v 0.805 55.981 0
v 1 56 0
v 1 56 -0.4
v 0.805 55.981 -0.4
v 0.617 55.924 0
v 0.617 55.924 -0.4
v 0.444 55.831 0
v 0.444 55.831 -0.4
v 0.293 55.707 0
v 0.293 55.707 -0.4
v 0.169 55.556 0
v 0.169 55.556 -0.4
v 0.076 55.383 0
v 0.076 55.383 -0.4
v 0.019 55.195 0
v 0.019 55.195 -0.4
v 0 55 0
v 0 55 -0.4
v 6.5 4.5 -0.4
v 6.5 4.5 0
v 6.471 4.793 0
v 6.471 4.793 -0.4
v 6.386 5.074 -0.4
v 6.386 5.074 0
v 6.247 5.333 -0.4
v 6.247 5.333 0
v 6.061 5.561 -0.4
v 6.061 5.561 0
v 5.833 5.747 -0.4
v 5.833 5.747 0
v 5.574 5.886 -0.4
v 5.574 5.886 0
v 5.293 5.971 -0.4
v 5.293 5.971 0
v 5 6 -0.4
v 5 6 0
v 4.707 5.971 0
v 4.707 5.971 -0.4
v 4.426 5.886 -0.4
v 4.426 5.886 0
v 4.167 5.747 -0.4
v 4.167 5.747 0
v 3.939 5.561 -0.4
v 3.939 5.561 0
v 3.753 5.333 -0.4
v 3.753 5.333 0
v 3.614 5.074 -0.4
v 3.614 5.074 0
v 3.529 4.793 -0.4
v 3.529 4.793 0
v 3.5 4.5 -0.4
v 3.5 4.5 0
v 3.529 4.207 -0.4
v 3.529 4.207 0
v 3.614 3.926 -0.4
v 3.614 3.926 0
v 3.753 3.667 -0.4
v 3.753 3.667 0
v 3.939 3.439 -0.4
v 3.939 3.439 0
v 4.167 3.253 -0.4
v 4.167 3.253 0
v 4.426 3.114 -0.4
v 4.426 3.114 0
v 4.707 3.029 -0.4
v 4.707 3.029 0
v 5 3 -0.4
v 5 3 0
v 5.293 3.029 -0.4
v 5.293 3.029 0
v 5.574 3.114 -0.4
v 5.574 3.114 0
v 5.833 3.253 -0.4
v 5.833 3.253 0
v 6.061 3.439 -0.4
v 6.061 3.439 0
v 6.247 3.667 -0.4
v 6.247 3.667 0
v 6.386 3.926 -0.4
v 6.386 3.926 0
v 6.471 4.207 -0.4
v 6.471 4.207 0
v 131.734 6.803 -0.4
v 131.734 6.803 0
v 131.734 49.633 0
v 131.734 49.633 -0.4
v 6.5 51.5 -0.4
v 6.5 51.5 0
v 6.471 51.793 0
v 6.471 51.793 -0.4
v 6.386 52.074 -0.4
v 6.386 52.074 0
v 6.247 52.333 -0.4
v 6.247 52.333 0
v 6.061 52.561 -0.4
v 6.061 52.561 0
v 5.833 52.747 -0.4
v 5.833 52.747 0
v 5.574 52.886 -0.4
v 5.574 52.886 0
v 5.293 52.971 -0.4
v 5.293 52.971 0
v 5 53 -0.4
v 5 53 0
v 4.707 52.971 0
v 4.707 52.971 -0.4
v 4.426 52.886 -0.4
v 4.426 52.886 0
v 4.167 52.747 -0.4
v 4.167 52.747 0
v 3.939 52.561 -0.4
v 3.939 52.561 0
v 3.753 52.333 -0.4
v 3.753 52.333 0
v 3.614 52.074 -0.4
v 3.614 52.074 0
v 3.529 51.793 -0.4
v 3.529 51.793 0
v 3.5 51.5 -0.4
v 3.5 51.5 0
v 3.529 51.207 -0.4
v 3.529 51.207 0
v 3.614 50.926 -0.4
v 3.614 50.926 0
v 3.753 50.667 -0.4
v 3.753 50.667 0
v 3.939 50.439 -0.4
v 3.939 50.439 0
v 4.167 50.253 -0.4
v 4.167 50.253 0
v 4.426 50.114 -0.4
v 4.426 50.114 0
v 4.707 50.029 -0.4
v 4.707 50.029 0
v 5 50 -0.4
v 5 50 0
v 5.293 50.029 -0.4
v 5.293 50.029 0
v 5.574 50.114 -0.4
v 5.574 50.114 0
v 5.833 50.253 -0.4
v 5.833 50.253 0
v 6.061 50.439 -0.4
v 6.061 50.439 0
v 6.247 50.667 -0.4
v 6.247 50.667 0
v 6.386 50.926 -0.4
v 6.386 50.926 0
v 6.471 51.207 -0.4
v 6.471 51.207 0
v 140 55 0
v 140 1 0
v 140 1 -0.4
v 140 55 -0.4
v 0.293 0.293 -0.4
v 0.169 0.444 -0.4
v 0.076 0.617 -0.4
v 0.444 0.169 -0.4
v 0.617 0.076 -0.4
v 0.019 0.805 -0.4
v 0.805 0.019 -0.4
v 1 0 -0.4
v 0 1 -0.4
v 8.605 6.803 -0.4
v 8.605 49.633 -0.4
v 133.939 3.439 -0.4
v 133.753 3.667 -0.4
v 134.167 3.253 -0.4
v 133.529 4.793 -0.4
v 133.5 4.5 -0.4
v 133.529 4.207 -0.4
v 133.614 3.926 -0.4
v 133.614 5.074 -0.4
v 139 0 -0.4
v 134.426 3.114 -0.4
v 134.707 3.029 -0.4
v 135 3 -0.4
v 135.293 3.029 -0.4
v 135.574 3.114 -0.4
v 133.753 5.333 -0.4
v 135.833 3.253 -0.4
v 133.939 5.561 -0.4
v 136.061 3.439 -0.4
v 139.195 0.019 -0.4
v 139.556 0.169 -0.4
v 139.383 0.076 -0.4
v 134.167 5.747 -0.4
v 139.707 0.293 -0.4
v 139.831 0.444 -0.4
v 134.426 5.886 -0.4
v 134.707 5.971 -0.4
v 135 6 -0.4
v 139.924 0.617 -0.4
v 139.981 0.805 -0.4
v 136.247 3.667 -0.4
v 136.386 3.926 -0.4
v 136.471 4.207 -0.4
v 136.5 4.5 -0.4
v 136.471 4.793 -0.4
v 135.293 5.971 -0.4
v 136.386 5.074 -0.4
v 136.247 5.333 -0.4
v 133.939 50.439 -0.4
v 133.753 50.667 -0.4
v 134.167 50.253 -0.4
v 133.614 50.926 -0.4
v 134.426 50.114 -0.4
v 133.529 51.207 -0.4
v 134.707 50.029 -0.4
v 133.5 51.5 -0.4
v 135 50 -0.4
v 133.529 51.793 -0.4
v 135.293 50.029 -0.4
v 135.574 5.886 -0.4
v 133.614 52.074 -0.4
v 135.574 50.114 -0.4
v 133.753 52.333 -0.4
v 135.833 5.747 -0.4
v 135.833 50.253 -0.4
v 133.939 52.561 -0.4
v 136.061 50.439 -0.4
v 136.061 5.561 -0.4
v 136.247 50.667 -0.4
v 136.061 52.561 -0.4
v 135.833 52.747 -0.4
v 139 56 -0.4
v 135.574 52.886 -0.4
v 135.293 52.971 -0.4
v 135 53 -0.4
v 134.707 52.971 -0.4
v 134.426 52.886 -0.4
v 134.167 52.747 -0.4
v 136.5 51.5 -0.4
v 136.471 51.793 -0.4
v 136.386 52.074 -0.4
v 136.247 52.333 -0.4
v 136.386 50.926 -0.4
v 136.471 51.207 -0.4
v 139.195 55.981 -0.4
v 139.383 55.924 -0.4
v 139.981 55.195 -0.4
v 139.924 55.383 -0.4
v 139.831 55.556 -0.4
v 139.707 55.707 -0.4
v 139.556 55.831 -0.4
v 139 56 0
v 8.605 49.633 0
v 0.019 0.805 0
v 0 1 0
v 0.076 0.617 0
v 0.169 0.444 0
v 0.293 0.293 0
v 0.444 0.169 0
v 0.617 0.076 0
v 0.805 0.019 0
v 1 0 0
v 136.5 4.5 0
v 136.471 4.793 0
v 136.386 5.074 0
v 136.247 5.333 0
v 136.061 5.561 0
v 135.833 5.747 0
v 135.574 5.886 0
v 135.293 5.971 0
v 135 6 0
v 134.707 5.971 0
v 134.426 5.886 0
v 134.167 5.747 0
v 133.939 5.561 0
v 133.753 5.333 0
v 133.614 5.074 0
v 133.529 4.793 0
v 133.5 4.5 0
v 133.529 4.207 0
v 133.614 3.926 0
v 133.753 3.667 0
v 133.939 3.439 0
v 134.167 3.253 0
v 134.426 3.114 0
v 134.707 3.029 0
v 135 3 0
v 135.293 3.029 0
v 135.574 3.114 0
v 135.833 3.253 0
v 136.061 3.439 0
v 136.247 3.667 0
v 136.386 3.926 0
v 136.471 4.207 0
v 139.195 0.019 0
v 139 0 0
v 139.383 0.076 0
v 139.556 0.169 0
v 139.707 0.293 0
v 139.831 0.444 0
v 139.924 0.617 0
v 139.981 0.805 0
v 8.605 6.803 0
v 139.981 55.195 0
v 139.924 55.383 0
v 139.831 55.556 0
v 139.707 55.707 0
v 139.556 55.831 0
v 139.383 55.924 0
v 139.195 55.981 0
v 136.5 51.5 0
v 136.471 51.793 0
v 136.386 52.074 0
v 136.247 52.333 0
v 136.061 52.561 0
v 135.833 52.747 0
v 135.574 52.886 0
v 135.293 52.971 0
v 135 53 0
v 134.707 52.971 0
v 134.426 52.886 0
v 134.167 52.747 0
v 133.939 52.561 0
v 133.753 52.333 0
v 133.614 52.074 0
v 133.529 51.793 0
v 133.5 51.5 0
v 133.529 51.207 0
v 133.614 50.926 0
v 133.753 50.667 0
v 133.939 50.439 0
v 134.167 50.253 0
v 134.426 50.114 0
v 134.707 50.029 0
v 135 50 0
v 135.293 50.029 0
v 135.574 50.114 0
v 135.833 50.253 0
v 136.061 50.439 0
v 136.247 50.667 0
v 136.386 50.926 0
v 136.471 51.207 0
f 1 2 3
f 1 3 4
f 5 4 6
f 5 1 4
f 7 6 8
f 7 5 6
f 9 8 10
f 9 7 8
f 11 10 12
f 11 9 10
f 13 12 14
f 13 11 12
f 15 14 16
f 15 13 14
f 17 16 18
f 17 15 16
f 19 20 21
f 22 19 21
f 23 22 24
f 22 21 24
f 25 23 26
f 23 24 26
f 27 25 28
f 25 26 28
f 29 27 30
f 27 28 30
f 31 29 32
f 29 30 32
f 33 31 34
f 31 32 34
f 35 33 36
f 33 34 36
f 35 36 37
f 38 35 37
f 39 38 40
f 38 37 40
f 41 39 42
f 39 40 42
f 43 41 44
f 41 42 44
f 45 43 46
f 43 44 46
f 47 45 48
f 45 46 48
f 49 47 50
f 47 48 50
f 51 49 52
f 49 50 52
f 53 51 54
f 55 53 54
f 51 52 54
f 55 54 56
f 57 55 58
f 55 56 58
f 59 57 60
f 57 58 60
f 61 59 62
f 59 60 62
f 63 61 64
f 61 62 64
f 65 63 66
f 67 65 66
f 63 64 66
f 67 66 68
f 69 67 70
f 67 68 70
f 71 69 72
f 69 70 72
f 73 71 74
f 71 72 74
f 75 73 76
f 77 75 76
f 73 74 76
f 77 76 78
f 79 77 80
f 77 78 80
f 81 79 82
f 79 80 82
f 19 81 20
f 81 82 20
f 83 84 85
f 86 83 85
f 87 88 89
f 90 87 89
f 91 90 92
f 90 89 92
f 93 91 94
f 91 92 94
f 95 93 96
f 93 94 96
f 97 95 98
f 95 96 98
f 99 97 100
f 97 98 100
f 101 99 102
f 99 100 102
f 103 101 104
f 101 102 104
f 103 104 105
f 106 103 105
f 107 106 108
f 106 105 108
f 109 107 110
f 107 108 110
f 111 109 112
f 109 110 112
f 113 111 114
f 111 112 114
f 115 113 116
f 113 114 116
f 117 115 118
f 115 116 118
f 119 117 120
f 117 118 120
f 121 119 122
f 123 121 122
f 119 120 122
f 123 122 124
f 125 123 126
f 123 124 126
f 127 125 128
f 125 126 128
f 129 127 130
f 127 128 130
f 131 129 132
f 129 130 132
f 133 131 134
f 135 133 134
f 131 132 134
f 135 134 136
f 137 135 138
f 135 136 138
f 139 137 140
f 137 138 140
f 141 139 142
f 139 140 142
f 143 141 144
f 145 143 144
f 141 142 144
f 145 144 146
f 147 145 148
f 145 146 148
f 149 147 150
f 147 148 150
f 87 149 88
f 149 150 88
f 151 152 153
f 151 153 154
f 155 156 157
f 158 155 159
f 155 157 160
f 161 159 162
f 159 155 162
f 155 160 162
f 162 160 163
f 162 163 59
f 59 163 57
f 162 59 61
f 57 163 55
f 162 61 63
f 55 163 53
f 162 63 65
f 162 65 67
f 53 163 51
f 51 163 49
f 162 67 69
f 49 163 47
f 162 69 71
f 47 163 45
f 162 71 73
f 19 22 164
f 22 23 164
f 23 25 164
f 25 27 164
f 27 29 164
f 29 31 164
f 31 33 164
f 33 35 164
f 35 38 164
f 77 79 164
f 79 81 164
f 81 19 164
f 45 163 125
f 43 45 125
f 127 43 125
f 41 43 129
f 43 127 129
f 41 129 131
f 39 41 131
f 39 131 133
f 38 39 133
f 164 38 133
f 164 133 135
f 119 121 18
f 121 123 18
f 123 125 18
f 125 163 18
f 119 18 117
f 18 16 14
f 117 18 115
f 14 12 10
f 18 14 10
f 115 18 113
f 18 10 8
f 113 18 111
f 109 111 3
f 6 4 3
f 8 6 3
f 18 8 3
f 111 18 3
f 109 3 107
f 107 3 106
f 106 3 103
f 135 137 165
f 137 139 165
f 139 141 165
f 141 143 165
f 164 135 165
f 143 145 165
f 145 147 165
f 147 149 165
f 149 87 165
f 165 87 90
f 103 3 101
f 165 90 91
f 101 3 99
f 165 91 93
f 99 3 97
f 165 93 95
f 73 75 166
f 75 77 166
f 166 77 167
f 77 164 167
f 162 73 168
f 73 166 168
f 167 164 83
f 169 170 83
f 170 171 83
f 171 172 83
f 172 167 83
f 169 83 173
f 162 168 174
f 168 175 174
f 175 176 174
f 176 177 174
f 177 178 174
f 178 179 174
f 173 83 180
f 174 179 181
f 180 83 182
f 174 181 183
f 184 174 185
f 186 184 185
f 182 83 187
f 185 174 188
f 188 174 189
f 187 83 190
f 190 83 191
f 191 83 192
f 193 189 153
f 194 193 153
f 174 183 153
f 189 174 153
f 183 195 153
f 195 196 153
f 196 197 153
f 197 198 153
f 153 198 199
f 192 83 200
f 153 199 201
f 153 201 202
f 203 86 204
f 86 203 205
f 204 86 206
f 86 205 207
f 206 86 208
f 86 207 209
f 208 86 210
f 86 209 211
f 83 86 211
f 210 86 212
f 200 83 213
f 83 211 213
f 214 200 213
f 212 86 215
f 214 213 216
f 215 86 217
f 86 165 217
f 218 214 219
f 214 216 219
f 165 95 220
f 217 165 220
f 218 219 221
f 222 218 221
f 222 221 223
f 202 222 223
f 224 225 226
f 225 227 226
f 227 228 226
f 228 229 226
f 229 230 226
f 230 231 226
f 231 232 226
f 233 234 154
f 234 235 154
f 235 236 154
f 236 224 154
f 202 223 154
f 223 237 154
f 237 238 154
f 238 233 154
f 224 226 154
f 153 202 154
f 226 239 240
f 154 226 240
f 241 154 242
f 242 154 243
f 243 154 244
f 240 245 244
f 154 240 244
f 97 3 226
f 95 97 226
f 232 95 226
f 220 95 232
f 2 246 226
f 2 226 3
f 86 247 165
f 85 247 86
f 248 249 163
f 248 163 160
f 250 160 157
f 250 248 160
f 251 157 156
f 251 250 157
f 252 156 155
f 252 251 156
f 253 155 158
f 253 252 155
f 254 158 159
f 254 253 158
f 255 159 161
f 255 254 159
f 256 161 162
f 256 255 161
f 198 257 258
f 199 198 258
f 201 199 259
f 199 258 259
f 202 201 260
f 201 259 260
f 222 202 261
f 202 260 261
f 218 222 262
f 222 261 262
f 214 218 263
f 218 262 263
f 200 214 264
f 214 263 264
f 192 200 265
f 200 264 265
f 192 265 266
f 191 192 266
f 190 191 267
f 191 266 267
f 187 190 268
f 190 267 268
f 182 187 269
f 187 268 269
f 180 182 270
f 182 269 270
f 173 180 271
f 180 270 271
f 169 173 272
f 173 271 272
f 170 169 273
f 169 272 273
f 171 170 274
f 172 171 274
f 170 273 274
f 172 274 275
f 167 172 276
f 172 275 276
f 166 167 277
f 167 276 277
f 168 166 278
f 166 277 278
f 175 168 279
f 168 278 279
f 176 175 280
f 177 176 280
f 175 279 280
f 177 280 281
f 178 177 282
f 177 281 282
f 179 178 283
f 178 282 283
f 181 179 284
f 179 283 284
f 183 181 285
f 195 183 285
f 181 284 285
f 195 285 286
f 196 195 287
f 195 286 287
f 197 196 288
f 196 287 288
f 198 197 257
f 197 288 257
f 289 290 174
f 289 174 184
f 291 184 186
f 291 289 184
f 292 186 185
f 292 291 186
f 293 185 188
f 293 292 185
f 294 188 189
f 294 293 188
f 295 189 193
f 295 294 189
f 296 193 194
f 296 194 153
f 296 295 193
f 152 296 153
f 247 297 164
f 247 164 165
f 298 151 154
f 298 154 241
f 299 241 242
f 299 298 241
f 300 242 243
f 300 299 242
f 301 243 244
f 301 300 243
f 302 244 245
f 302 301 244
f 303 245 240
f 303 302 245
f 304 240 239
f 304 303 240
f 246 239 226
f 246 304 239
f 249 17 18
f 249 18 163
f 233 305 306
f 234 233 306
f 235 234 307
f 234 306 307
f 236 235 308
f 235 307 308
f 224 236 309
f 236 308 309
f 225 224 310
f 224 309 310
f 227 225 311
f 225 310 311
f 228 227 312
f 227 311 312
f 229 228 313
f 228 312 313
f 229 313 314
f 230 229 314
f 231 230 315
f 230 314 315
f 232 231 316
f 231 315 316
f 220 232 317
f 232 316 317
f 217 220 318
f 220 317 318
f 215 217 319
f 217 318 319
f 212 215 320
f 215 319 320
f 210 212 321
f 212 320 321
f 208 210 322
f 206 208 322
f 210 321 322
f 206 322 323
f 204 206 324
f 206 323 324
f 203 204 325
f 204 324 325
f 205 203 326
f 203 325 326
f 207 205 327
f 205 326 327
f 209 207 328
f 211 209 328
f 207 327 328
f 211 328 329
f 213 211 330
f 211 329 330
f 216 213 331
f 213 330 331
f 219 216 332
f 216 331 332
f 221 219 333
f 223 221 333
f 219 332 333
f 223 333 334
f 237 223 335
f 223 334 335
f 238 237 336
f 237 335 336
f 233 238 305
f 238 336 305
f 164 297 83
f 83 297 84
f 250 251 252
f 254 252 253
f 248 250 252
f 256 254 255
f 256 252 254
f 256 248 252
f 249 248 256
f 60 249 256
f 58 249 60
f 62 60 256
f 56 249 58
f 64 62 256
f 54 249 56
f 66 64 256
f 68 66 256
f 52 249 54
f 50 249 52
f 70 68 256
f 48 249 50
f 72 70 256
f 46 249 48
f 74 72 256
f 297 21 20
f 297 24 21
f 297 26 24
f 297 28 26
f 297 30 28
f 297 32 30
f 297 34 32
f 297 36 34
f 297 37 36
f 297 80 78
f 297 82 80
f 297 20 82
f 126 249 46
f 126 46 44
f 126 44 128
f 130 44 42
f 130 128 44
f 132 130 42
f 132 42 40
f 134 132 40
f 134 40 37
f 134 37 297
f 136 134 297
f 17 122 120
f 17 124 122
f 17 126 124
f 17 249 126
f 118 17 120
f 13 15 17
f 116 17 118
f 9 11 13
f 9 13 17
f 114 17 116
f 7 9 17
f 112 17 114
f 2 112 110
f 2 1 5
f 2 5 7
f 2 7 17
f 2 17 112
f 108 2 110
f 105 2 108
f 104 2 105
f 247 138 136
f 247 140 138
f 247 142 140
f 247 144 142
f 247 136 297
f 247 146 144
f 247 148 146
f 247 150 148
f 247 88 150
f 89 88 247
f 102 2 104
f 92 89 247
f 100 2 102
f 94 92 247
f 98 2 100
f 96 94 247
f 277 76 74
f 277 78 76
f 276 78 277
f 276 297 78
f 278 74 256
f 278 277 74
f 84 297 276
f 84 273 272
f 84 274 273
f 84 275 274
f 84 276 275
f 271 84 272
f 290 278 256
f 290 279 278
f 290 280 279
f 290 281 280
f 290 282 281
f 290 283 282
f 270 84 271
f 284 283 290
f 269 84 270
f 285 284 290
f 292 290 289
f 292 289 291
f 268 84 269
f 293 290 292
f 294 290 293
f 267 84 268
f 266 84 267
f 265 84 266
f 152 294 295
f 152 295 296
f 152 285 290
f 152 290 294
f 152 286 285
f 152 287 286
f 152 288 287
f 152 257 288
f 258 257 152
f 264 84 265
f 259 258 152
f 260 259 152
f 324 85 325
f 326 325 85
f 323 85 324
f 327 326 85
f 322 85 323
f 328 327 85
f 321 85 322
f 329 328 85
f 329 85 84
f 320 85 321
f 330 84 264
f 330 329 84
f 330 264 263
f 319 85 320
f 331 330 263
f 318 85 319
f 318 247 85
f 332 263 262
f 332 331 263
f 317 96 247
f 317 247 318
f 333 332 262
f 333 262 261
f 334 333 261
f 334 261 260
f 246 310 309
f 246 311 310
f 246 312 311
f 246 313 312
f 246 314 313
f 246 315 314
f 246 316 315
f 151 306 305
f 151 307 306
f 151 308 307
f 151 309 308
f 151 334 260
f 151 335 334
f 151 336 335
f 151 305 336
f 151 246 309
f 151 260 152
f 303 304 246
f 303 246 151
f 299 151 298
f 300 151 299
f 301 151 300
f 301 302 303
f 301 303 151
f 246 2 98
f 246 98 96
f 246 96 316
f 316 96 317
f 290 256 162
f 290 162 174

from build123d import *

# Parameters (mm, degrees)
SKETCH1_R           = 1.5
SKETCH1_W           = 123.128854939
SKETCH1_H           = 42.830428858
BOSS_EXTRUDE1_DEPTH = 0.4


with BuildPart() as part:
    # Sketch1 → Boss-Extrude1 (new body)
    with BuildSketch(Plane.XY):
        with BuildLine():
            Line((1, 0), (139, 0))
            ThreePointArc((139, 0), (139.707106781, 0.292893219), (140, 1))
            Line((140, 1), (140, 55))
            ThreePointArc((140, 55), (139.707106781, 55.707106781), (139, 56))
            Line((139, 56), (1, 56))
            ThreePointArc((1, 56), (0.292893219, 55.707106781), (0, 55))
            Line((0, 55), (0, 1))
            ThreePointArc((0, 1), (0.292893219, 0.292893219), (1, 0))
        make_face()
        with Locations((5, 51.5)):
            Circle(SKETCH1_R, mode=Mode.SUBTRACT)
        with Locations((5, 4.5)):
            Circle(SKETCH1_R, mode=Mode.SUBTRACT)
        with Locations((135, 4.5)):
            Circle(SKETCH1_R, mode=Mode.SUBTRACT)
        with Locations((135, 51.5)):
            Circle(SKETCH1_R, mode=Mode.SUBTRACT)
        with Locations((70.169366708, 28.217965612)):
            Rectangle(SKETCH1_W, SKETCH1_H, mode=Mode.SUBTRACT)
    extrude(amount=-BOSS_EXTRUDE1_DEPTH)


solid = part.part
